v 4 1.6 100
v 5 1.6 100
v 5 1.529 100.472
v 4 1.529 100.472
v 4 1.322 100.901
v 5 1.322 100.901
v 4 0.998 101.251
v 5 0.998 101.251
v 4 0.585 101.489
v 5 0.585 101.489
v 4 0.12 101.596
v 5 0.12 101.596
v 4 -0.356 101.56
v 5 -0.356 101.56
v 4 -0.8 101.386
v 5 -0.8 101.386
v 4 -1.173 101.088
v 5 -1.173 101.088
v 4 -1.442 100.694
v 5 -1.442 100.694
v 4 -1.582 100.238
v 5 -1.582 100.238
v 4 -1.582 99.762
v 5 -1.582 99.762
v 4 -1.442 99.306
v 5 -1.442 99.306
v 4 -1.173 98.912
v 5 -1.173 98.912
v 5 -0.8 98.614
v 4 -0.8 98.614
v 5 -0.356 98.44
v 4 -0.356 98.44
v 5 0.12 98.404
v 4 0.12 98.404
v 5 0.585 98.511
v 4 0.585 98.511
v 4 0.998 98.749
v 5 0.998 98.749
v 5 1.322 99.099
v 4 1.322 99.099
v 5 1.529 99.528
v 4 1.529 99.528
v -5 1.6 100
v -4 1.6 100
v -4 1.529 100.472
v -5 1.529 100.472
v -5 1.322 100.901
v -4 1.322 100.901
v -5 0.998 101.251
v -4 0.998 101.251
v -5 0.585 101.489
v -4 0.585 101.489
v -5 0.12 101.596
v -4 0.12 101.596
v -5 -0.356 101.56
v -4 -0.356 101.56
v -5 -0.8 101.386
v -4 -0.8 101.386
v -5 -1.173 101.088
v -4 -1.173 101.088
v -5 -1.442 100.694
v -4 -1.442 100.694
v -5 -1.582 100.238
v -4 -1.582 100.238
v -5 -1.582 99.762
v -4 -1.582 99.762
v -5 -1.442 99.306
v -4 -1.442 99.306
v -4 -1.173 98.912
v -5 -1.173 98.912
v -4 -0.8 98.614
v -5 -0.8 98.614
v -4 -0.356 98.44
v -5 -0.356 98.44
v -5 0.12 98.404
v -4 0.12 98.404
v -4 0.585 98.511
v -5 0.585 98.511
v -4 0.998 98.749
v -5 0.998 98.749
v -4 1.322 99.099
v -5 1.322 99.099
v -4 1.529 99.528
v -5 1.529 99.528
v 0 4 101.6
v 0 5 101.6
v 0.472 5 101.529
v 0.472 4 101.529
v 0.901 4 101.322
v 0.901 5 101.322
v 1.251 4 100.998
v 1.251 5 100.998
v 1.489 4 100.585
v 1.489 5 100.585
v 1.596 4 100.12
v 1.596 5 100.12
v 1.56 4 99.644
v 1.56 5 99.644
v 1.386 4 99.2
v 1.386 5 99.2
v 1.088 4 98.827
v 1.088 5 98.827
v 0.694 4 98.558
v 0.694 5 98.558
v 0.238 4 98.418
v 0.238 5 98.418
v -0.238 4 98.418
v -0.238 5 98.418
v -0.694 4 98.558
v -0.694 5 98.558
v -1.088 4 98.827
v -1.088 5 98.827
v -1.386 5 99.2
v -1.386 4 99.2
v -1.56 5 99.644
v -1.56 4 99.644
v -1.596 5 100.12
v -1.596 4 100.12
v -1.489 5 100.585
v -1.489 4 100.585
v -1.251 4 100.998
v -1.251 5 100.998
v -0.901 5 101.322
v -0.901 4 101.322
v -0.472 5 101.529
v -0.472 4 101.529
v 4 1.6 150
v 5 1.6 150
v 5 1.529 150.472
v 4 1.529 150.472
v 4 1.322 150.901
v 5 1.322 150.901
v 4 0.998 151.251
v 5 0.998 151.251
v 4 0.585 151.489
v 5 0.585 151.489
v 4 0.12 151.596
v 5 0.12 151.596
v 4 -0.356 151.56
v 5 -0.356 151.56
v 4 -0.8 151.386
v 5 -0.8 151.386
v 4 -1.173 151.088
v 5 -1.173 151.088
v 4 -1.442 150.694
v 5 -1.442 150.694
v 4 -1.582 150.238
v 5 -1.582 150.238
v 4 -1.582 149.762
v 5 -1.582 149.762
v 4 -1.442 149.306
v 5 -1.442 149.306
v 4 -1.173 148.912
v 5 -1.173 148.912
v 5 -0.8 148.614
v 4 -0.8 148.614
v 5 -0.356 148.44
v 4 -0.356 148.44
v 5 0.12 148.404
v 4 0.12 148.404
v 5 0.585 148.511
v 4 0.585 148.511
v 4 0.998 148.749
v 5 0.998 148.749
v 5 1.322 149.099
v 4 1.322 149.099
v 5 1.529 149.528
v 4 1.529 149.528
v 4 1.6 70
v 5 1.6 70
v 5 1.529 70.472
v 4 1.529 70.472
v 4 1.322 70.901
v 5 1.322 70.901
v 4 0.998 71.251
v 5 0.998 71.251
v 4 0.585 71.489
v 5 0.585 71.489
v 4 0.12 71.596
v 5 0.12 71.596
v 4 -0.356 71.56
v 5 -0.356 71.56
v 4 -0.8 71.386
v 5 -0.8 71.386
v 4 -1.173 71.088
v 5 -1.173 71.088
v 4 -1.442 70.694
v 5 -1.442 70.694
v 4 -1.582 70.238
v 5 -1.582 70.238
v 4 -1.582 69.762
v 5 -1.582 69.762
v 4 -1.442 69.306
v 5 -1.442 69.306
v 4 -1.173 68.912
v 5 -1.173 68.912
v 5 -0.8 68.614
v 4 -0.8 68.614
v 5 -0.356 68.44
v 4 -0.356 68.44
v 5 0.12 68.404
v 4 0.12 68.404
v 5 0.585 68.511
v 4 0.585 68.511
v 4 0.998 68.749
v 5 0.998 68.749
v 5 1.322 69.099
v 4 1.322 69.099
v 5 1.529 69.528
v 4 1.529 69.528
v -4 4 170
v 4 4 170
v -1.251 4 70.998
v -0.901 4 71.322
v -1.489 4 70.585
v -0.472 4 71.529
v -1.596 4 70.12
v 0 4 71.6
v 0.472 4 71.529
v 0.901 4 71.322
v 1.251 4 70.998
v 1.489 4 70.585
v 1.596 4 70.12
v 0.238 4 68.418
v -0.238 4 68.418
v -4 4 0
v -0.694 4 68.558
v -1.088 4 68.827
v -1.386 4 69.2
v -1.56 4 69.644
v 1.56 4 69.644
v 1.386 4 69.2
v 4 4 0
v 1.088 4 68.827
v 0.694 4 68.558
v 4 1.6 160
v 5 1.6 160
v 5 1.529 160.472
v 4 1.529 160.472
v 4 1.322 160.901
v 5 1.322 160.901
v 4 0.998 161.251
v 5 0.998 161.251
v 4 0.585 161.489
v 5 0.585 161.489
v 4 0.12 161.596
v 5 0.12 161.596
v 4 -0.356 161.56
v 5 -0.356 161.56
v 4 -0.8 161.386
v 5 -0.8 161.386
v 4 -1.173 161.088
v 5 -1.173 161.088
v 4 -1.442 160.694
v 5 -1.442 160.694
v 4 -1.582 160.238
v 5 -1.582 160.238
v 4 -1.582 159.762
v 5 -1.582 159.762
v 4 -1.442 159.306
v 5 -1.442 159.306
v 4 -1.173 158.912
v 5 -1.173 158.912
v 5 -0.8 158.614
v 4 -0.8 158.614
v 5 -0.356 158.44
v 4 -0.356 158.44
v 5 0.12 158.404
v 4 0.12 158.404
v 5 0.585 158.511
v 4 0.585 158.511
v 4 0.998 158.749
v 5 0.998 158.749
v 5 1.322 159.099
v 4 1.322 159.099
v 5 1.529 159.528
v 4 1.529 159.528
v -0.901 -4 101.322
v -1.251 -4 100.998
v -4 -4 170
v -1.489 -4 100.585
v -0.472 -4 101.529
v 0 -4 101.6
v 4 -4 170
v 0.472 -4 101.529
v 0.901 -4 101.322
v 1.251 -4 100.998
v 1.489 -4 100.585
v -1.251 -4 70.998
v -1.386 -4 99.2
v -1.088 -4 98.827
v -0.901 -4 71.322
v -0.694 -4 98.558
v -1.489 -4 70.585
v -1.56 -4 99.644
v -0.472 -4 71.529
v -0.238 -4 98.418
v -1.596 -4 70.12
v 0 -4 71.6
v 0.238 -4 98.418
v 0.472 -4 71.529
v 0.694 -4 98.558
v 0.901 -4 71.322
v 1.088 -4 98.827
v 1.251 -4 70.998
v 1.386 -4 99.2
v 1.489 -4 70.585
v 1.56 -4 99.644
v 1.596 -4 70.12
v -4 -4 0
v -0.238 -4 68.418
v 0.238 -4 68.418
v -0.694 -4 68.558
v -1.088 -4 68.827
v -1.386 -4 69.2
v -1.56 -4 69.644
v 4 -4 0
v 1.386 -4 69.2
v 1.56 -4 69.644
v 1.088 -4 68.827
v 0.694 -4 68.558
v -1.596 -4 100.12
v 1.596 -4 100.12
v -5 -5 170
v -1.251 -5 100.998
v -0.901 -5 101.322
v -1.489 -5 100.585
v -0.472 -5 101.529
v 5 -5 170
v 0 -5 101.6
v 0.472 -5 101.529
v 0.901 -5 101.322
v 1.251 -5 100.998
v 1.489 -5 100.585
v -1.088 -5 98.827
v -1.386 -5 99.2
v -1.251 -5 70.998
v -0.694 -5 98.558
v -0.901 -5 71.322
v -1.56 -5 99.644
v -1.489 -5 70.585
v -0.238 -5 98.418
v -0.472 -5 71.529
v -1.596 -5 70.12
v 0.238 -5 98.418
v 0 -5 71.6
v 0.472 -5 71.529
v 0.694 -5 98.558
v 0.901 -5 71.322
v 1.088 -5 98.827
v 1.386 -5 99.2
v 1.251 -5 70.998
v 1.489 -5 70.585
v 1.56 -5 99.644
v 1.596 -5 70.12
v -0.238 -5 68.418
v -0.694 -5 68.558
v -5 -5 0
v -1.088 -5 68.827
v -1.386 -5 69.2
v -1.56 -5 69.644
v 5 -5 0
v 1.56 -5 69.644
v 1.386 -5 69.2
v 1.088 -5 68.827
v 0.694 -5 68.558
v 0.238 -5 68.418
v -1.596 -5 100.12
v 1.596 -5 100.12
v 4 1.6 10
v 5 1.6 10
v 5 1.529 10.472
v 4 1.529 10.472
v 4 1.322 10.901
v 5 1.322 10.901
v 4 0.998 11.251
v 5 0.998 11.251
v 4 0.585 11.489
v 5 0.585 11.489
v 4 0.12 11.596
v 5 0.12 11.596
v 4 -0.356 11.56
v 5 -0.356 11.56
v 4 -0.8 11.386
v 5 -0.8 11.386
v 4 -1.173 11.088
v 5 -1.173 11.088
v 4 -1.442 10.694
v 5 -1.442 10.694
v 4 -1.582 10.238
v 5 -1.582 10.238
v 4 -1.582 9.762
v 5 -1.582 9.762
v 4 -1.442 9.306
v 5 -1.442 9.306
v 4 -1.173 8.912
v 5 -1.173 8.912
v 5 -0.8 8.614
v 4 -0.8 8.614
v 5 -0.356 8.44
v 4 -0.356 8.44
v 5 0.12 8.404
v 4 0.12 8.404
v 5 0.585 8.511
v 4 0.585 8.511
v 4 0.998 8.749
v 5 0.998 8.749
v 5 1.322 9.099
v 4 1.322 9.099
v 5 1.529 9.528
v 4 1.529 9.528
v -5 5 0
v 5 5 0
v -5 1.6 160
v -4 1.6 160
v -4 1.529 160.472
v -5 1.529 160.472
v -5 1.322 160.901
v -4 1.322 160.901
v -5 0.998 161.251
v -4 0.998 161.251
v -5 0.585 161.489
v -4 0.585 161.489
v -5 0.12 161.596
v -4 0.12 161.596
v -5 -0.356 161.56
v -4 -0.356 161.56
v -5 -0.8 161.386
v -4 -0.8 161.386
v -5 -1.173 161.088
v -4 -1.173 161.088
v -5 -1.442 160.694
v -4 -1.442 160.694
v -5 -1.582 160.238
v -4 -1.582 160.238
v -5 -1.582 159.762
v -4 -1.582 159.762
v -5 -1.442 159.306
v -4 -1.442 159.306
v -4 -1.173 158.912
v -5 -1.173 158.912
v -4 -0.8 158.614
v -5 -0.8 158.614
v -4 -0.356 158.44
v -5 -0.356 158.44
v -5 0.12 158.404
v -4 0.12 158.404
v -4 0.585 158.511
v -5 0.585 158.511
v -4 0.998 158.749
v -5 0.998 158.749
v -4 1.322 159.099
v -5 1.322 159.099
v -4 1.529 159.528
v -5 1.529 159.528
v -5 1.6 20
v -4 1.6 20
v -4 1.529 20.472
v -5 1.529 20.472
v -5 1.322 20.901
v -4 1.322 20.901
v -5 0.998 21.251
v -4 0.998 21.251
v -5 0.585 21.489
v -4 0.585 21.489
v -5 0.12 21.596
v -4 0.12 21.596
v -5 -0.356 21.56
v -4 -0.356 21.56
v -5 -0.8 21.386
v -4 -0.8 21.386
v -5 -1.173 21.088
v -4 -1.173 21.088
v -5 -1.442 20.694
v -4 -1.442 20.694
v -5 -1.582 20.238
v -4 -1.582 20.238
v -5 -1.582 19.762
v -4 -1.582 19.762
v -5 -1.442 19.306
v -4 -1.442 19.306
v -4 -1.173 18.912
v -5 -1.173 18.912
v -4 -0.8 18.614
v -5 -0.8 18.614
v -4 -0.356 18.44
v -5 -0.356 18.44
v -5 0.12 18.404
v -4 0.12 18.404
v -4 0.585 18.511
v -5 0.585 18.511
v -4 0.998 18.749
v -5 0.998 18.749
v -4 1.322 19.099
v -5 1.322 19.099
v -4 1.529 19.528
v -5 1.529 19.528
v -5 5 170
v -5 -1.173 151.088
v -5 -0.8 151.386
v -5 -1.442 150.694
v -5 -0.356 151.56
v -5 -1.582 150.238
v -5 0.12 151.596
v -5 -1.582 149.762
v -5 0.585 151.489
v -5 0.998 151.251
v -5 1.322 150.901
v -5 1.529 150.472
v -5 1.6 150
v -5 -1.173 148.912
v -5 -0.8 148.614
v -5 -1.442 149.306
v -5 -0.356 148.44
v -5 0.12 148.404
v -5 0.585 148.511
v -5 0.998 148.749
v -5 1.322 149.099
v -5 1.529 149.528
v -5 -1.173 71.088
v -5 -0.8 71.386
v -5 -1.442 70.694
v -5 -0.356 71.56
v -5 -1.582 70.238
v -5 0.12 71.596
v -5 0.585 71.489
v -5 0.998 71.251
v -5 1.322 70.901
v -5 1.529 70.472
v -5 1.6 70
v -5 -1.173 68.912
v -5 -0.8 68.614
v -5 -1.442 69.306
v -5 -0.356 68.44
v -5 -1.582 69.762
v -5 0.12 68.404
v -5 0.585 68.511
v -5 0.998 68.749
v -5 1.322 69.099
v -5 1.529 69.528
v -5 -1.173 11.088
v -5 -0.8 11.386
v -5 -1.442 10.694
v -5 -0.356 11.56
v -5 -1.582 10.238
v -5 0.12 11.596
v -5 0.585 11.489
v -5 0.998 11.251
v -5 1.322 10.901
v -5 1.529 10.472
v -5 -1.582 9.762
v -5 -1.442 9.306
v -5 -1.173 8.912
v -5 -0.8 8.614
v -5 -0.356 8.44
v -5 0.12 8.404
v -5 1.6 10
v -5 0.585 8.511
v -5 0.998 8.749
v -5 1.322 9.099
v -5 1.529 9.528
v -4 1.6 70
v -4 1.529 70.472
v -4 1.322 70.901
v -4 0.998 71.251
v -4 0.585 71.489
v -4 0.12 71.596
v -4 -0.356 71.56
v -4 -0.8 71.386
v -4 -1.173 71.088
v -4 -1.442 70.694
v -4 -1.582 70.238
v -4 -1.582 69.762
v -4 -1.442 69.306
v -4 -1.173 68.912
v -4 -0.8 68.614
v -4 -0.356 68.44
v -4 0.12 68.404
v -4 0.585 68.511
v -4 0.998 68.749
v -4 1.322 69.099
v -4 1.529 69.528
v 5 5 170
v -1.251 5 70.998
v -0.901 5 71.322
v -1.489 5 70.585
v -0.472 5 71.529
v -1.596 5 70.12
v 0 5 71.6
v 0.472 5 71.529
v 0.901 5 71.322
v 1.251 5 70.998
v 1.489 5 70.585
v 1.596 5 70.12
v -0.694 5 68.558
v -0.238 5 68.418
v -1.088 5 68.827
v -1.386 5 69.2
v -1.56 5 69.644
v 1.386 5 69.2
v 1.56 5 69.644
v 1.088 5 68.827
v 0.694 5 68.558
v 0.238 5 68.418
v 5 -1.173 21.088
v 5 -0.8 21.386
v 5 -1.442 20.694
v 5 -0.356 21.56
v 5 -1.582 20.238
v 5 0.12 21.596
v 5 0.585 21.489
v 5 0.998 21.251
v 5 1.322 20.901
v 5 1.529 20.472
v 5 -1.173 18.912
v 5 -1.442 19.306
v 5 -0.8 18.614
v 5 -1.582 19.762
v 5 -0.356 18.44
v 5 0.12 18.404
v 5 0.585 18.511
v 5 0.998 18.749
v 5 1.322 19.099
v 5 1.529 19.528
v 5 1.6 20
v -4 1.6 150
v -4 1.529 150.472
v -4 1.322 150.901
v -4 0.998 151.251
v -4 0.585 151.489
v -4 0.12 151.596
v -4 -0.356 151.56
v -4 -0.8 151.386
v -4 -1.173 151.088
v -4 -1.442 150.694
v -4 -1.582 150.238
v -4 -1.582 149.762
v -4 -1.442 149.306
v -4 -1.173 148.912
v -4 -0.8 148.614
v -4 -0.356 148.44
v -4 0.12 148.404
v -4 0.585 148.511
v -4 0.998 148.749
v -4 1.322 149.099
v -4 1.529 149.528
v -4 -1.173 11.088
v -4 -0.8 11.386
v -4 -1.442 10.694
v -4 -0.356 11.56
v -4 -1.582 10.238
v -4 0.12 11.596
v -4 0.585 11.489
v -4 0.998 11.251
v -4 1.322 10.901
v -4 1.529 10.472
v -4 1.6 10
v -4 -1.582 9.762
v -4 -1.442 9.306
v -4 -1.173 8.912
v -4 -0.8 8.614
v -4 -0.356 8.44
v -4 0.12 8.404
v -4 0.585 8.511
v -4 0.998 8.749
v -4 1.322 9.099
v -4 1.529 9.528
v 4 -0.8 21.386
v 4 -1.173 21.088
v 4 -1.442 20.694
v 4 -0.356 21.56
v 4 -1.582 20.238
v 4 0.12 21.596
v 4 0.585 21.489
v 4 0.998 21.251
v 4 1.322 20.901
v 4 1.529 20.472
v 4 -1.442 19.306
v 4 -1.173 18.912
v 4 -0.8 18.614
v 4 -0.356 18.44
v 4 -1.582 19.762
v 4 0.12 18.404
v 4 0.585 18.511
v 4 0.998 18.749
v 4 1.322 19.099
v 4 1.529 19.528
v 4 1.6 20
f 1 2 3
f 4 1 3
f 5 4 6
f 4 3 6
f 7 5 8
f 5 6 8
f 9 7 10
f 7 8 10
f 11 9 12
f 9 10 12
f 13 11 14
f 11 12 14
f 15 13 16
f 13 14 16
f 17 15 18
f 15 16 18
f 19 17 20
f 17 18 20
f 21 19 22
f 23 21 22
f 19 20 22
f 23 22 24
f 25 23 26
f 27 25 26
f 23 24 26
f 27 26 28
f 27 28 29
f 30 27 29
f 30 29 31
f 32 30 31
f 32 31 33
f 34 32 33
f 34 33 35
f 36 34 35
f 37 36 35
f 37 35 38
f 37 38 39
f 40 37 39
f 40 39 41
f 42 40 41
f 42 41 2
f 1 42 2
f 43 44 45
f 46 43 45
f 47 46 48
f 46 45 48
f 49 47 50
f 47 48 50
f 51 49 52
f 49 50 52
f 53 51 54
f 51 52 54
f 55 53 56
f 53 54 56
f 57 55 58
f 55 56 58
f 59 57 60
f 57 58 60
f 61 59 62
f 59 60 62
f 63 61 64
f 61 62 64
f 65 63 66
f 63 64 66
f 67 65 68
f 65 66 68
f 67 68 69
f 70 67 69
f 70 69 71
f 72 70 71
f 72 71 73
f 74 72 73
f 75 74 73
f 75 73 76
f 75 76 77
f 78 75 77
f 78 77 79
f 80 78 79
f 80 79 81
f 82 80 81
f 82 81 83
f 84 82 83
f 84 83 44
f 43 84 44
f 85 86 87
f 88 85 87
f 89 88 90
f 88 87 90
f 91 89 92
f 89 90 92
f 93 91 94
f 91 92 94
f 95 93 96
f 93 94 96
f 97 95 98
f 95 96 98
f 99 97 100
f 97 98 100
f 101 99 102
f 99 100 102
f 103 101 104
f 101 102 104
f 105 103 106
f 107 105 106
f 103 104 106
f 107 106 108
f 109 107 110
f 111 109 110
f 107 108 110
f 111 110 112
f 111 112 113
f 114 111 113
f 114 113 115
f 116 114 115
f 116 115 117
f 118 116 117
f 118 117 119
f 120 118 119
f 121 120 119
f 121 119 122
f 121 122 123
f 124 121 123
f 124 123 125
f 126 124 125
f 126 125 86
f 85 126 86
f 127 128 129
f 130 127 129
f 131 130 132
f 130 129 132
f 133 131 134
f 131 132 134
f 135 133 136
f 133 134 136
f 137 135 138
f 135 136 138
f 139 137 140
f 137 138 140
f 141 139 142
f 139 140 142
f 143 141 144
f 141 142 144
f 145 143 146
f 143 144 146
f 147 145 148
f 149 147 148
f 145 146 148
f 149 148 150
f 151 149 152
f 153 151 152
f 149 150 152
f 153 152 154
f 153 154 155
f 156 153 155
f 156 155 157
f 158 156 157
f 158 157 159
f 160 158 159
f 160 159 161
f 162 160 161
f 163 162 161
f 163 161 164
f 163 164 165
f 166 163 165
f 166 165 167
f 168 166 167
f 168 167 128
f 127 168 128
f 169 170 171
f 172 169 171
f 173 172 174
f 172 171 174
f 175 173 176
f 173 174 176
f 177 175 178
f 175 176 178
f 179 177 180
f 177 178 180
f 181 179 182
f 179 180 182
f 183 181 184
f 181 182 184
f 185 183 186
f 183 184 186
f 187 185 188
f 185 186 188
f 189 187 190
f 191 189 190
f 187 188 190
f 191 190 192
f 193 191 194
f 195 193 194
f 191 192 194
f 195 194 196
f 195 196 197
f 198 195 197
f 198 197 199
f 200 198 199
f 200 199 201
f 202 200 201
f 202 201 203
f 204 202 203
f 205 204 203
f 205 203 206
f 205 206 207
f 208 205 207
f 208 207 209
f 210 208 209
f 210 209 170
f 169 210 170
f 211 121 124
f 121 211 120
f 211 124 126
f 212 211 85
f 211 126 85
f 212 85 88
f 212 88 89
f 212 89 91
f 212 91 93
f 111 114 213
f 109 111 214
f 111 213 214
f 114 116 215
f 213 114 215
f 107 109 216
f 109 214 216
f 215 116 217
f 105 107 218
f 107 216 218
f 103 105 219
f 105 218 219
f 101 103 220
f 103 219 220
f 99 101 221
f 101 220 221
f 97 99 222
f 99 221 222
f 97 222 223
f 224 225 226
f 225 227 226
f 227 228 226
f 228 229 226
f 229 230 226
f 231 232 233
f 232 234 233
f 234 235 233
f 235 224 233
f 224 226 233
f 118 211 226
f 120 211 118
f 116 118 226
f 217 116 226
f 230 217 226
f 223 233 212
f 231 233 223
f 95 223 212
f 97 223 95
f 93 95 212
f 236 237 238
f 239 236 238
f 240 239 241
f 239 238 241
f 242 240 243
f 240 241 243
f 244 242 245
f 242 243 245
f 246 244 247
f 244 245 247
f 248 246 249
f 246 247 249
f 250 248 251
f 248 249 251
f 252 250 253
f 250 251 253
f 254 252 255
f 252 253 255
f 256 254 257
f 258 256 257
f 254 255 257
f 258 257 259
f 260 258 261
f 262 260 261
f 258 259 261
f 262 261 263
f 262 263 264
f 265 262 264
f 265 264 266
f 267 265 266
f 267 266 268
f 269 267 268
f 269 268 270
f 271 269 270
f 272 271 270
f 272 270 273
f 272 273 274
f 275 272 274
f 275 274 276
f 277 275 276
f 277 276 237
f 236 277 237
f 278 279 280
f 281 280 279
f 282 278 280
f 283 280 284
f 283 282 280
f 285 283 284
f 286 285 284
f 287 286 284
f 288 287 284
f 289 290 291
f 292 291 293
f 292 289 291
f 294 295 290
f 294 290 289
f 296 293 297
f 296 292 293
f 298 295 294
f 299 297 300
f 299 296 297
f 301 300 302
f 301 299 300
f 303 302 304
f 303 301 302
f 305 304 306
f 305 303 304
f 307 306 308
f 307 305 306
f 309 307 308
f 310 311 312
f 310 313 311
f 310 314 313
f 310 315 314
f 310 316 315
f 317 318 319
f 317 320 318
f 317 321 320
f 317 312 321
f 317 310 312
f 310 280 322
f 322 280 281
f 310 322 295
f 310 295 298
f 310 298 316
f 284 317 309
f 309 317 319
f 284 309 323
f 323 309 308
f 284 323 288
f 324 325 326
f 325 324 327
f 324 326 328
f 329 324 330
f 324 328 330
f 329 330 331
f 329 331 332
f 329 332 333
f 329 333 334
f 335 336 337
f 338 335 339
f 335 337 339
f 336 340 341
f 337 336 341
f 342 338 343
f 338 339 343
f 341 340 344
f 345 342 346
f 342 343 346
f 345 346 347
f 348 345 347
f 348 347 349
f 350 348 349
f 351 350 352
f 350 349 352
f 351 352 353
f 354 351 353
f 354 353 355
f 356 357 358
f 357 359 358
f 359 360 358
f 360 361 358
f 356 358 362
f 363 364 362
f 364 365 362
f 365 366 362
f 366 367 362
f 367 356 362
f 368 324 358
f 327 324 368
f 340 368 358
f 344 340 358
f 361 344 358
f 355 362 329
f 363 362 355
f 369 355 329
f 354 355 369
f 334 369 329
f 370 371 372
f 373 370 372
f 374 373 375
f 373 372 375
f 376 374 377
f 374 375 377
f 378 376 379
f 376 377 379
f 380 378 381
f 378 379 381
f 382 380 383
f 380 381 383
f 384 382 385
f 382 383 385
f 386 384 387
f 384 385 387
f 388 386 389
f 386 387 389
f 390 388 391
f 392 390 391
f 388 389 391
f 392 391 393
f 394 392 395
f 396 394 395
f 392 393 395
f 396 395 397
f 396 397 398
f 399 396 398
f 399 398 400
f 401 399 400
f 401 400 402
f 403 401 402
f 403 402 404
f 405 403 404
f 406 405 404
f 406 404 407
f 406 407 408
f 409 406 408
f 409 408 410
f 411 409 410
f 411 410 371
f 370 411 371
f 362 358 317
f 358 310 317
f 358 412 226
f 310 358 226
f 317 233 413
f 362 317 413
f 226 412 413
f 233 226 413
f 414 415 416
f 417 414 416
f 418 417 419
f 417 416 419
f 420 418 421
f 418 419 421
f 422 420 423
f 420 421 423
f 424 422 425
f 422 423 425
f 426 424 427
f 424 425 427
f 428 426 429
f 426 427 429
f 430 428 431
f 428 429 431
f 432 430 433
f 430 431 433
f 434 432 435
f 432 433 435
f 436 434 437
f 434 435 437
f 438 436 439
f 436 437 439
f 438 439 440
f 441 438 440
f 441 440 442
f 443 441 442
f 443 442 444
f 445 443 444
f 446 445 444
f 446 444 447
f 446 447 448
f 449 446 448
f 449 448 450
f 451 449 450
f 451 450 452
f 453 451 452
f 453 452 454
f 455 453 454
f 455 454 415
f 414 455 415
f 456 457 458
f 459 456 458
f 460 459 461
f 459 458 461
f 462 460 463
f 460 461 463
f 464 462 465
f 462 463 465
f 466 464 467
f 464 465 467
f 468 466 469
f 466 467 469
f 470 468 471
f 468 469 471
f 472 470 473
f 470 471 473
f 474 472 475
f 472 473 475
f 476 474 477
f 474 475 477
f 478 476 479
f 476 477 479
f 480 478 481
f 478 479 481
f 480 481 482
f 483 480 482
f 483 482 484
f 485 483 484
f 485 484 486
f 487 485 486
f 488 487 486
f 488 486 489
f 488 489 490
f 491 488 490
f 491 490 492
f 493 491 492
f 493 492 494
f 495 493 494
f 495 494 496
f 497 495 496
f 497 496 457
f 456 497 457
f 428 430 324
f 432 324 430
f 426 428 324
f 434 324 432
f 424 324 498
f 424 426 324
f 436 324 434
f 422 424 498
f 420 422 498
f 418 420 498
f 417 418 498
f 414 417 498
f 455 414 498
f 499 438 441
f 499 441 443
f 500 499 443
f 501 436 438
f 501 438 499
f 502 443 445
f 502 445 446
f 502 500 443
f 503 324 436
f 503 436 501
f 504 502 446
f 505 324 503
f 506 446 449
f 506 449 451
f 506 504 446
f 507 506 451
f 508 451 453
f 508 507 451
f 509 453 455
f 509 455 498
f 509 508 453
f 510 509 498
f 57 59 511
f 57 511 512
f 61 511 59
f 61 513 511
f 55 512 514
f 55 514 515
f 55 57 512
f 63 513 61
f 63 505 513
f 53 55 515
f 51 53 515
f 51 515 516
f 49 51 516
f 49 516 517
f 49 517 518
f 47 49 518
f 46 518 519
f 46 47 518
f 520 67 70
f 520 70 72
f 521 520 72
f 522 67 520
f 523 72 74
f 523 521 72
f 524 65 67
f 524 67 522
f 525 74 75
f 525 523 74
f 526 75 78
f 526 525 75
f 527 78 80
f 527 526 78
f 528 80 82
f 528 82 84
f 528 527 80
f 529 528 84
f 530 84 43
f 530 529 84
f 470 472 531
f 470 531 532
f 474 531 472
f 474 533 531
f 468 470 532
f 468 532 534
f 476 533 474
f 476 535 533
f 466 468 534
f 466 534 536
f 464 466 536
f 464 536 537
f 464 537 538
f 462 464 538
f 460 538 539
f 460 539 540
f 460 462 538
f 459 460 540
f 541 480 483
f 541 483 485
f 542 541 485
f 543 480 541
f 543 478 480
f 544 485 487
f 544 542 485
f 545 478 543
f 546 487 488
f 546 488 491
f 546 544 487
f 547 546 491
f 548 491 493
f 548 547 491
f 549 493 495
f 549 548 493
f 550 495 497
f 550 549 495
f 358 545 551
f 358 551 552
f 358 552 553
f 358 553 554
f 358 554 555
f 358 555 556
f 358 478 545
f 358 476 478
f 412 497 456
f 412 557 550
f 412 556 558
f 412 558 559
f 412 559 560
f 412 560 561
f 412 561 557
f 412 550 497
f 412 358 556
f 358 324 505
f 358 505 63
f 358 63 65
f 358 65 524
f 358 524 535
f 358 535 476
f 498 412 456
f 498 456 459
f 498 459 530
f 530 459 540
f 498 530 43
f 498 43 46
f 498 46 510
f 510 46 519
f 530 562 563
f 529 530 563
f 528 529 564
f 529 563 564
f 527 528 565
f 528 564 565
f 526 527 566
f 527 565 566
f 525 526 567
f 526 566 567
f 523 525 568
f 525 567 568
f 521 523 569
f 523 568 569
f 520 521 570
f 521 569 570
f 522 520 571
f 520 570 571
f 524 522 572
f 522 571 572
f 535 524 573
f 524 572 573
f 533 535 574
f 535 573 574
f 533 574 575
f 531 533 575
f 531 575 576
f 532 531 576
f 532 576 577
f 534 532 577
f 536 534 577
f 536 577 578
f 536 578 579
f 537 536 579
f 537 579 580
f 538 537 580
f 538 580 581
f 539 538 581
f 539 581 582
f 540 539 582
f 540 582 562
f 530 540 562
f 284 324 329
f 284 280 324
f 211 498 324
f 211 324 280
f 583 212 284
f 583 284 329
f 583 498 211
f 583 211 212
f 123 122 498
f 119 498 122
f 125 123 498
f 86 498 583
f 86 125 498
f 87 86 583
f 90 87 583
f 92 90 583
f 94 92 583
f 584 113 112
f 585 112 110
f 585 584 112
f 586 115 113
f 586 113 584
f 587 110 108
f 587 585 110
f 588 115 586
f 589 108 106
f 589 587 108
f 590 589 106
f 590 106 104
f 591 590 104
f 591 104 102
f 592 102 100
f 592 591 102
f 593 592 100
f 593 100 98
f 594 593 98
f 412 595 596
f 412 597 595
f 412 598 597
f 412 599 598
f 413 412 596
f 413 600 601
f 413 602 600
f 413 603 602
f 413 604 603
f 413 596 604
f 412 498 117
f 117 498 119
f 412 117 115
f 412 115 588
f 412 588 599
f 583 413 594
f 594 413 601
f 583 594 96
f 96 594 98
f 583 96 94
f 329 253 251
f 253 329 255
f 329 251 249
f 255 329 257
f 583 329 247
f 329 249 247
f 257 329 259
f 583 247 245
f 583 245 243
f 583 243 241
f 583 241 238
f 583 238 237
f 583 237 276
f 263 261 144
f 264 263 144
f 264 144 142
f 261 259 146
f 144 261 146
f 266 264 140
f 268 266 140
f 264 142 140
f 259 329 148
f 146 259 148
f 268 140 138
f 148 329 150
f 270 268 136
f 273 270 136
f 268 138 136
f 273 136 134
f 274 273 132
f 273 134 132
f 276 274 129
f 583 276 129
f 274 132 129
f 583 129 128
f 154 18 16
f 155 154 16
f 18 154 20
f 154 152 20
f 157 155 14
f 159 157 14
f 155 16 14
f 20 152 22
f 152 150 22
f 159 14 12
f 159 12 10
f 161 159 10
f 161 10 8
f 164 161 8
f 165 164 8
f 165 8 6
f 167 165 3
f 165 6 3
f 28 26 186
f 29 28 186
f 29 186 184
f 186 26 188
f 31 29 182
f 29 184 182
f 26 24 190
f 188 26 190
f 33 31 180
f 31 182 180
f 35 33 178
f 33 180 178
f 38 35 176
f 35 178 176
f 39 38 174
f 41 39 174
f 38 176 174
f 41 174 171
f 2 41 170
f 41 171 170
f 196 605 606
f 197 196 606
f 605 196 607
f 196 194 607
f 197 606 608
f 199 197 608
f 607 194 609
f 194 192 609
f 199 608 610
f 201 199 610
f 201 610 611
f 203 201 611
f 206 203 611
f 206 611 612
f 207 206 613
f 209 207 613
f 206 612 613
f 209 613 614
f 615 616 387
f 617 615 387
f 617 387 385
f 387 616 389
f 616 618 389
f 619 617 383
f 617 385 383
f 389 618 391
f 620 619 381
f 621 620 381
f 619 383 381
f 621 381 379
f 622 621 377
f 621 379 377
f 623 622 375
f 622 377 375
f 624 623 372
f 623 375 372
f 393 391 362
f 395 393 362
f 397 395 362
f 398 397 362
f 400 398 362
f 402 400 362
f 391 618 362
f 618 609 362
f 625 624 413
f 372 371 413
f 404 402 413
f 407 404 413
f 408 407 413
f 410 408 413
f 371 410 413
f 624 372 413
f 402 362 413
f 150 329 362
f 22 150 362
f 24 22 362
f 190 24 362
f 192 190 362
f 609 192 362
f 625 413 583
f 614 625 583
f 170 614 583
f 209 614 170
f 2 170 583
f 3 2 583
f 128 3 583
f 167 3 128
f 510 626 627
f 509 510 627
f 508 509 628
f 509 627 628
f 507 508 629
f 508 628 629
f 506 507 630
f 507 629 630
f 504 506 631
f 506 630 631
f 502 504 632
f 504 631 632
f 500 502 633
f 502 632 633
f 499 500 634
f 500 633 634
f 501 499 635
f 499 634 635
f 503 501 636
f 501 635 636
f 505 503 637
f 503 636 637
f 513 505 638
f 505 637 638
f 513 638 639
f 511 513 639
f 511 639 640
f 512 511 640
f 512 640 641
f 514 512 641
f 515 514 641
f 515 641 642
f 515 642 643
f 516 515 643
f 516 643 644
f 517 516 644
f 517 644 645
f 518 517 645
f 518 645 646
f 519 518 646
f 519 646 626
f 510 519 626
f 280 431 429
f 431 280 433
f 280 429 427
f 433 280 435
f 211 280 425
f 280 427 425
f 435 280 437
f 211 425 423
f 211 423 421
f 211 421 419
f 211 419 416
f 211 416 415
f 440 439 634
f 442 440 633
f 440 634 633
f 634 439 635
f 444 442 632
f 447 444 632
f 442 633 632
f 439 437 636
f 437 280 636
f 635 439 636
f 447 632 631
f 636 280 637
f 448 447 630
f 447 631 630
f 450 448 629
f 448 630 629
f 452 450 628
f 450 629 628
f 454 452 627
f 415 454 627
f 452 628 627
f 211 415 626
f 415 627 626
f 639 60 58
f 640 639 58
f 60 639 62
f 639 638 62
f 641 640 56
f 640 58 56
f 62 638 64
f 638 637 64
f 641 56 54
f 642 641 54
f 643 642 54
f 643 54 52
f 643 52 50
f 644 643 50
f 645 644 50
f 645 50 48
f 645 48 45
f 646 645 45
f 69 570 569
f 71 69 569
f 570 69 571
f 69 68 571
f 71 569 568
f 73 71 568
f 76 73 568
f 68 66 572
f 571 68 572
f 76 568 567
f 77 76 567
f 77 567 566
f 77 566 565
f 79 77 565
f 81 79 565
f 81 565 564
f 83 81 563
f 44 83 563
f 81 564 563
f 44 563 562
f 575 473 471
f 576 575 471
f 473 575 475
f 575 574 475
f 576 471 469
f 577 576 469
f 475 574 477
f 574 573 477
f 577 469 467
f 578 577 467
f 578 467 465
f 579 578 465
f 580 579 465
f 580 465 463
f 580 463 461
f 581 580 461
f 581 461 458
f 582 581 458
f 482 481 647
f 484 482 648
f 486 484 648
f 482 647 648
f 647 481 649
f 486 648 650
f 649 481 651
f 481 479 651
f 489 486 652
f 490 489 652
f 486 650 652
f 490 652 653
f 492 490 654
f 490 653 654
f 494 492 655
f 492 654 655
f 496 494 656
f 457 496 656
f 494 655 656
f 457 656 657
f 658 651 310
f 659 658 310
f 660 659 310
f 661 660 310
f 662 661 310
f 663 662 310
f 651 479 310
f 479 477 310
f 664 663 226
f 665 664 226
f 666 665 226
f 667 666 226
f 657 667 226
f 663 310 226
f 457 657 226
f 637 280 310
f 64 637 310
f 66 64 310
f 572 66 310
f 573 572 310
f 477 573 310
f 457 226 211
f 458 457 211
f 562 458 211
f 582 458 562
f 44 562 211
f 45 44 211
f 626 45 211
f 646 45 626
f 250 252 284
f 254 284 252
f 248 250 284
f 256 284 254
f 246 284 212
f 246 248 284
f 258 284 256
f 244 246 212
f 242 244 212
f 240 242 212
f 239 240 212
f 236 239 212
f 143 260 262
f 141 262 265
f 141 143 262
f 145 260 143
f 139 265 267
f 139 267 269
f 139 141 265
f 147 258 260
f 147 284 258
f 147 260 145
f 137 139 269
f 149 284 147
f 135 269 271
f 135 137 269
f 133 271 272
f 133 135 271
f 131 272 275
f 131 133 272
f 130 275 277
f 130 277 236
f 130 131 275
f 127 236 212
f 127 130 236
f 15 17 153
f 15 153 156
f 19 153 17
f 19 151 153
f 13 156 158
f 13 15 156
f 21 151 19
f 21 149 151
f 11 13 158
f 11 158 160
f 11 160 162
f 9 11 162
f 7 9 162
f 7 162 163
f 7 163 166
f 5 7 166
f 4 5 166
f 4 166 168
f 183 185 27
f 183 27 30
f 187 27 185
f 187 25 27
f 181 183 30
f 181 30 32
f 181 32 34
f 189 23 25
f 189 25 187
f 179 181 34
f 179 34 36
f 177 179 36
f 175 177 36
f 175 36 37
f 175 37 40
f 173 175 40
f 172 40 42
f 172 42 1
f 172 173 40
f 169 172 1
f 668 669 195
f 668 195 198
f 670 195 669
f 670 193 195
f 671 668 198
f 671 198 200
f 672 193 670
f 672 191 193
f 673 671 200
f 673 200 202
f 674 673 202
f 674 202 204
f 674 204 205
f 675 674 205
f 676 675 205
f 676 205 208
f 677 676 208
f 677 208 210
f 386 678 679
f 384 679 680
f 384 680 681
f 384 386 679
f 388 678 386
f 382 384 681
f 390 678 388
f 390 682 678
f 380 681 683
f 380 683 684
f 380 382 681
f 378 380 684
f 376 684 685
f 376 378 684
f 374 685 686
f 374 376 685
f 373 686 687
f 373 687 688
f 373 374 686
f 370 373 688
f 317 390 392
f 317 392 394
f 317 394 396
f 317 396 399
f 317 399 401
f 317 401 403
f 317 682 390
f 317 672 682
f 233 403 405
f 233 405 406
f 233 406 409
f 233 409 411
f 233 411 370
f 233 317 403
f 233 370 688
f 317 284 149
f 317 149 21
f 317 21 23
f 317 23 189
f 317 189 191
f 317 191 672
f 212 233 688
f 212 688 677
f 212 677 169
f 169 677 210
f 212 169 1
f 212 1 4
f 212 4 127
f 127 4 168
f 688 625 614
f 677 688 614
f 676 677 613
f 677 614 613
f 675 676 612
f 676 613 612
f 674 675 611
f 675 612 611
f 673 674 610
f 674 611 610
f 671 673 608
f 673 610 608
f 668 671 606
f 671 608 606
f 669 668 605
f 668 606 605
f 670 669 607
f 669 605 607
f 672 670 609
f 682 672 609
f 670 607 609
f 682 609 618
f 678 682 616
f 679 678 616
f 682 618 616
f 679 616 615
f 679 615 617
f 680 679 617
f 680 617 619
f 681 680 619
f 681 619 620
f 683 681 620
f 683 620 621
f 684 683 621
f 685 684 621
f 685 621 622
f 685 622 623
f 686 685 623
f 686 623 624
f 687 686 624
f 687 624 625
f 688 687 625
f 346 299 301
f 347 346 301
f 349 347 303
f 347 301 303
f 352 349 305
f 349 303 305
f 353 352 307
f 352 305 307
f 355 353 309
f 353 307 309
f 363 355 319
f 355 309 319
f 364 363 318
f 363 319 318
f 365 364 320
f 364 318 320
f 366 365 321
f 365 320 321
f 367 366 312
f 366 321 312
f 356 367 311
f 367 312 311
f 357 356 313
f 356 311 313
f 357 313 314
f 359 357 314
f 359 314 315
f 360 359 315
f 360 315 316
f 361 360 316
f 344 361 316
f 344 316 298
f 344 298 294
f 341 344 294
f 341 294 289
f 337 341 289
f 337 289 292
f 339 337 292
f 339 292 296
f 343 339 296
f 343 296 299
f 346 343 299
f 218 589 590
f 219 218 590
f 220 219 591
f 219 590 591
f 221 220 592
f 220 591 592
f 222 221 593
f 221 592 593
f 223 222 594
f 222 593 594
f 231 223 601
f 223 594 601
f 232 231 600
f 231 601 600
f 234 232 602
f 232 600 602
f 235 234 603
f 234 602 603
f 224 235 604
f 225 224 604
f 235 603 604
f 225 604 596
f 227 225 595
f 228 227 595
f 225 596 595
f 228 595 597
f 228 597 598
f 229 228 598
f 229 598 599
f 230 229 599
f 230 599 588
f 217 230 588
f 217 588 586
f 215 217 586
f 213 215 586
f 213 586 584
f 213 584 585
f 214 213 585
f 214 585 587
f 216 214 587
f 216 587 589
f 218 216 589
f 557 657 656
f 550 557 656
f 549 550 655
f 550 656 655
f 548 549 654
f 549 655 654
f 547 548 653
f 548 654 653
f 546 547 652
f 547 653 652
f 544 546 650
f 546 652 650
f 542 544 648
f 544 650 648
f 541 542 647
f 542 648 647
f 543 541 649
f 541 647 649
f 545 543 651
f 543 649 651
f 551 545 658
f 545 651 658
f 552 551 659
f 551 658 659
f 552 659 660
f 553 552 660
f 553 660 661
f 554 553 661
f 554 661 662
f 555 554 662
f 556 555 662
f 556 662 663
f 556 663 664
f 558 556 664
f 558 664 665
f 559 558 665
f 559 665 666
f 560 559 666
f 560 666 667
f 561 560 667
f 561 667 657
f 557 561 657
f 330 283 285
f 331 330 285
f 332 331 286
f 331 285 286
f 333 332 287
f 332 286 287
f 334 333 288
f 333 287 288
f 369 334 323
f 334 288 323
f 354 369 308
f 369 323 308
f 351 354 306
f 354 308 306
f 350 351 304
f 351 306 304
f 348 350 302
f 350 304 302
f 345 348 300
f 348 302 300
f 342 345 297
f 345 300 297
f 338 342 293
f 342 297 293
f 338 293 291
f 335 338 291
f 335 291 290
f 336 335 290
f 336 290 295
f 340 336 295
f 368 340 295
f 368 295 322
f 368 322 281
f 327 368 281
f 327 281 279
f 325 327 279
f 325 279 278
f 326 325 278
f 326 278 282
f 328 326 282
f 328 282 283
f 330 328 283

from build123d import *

# Parameters (mm, degrees)
SKETCH1_W           = 10
SKETCH1_H           = 10
SKETCH1_W_2         = 8
SKETCH1_H_2         = 8
BOSS_EXTRUDE1_DEPTH = 170
CUT_EXTRUDE1_REACH  = 172.367
SKETCH2_R           = 1.6
SKETCH3_R           = 1.6
CUT_EXTRUDE2_DEPTH  = 10


with BuildPart() as part:
    # Sketch1 → Boss-Extrude1 (new body)
    with BuildSketch(Plane.XY):
        Rectangle(SKETCH1_W, SKETCH1_H)
        Rectangle(SKETCH1_W_2, SKETCH1_H_2, mode=Mode.SUBTRACT)
    extrude(amount=BOSS_EXTRUDE1_DEPTH)

    # Cut-Extrude1: up to this face of the body (flat: up to its plane)
    cut_extrude1_end = Plane(part.part.faces().sort_by_distance((-5, 0, 85))[0])
    # Sketch2 → Cut-Extrude1 (cut, up to the picked face)
    with BuildSketch(Plane(origin=(5, 0, 0), x_dir=(0, 0, -1), z_dir=(1, 0, 0)), mode=Mode.PRIVATE) as cut_extrude1_sk1:
        with Locations(Location((-20, 0, 0), (0, 0, 90))):
            Circle(SKETCH2_R)
    cut_extrude1_tool1 = split(extrude(cut_extrude1_sk1.sketch, amount=-CUT_EXTRUDE1_REACH, mode=Mode.PRIVATE), bisect_by=cut_extrude1_end, keep=Keep.BOTH, mode=Mode.PRIVATE)
    # Sketch2 → Cut-Extrude1 (cut, up to the picked face)
    with BuildSketch(Plane(origin=(5, 0, 0), x_dir=(0, 0, -1), z_dir=(1, 0, 0)), mode=Mode.PRIVATE) as cut_extrude1_sk2:
        with Locations(Location((-10, 0, 0), (0, 0, 90))):
            Circle(SKETCH2_R)
    cut_extrude1_tool2 = split(extrude(cut_extrude1_sk2.sketch, amount=-CUT_EXTRUDE1_REACH, mode=Mode.PRIVATE), bisect_by=cut_extrude1_end, keep=Keep.BOTH, mode=Mode.PRIVATE)
    # Sketch2 → Cut-Extrude1 (cut, up to the picked face)
    with BuildSketch(Plane(origin=(5, 0, 0), x_dir=(0, 0, -1), z_dir=(1, 0, 0)), mode=Mode.PRIVATE) as cut_extrude1_sk3:
        with Locations(Location((-160, 0, 0), (0, 0, 90))):
            Circle(SKETCH2_R)
    cut_extrude1_tool3 = split(extrude(cut_extrude1_sk3.sketch, amount=-CUT_EXTRUDE1_REACH, mode=Mode.PRIVATE), bisect_by=cut_extrude1_end, keep=Keep.BOTH, mode=Mode.PRIVATE)
    # Sketch2 → Cut-Extrude1 (cut, up to the picked face)
    with BuildSketch(Plane(origin=(5, 0, 0), x_dir=(0, 0, -1), z_dir=(1, 0, 0)), mode=Mode.PRIVATE) as cut_extrude1_sk4:
        with Locations(Location((-150, 0, 0), (0, 0, 90))):
            Circle(SKETCH2_R)
    cut_extrude1_tool4 = split(extrude(cut_extrude1_sk4.sketch, amount=-CUT_EXTRUDE1_REACH, mode=Mode.PRIVATE), bisect_by=cut_extrude1_end, keep=Keep.BOTH, mode=Mode.PRIVATE)
    # Sketch2 → Cut-Extrude1 (cut, up to the picked face)
    with BuildSketch(Plane(origin=(5, 0, 0), x_dir=(0, 0, -1), z_dir=(1, 0, 0)), mode=Mode.PRIVATE) as cut_extrude1_sk5:
        with Locations(Location((-70, 0, 0), (0, 0, 90))):
            Circle(SKETCH2_R)
    cut_extrude1_tool5 = split(extrude(cut_extrude1_sk5.sketch, amount=-CUT_EXTRUDE1_REACH, mode=Mode.PRIVATE), bisect_by=cut_extrude1_end, keep=Keep.BOTH, mode=Mode.PRIVATE)
    # Sketch2 → Cut-Extrude1 (cut, up to the picked face)
    with BuildSketch(Plane(origin=(5, 0, 0), x_dir=(0, 0, -1), z_dir=(1, 0, 0)), mode=Mode.PRIVATE) as cut_extrude1_sk6:
        with Locations(Location((-100, 0, 0), (0, 0, 90))):
            Circle(SKETCH2_R)
    cut_extrude1_tool6 = split(extrude(cut_extrude1_sk6.sketch, amount=-CUT_EXTRUDE1_REACH, mode=Mode.PRIVATE), bisect_by=cut_extrude1_end, keep=Keep.BOTH, mode=Mode.PRIVATE)
    add(cut_extrude1_tool1.solids().sort_by(Axis((5, 0, 20), (-1, 0, 0)))[0], mode=Mode.SUBTRACT)
    add(cut_extrude1_tool2.solids().sort_by(Axis((5, 0, 10), (-1, 0, 0)))[0], mode=Mode.SUBTRACT)
    add(cut_extrude1_tool3.solids().sort_by(Axis((5, 0, 160), (-1, 0, 0)))[0], mode=Mode.SUBTRACT)
    add(cut_extrude1_tool4.solids().sort_by(Axis((5, 0, 150), (-1, 0, 0)))[0], mode=Mode.SUBTRACT)
    add(cut_extrude1_tool5.solids().sort_by(Axis((5, 0, 70), (-1, 0, 0)))[0], mode=Mode.SUBTRACT)
    add(cut_extrude1_tool6.solids().sort_by(Axis((5, 0, 100), (-1, 0, 0)))[0], mode=Mode.SUBTRACT)

    # Sketch3 → Cut-Extrude2 (cut)
    with BuildSketch(Plane(origin=(0, 5, 0), x_dir=(1, 0, 0), z_dir=(0, 1, 0))):
        with Locations(Location((0, -70, 0), (0, 0, 270))):
            Circle(SKETCH3_R)
        with Locations(Location((0, -100, 0), (0, 0, 270))):
            Circle(SKETCH3_R)
    extrude(amount=-CUT_EXTRUDE2_DEPTH, mode=Mode.SUBTRACT)


solid = part.part
